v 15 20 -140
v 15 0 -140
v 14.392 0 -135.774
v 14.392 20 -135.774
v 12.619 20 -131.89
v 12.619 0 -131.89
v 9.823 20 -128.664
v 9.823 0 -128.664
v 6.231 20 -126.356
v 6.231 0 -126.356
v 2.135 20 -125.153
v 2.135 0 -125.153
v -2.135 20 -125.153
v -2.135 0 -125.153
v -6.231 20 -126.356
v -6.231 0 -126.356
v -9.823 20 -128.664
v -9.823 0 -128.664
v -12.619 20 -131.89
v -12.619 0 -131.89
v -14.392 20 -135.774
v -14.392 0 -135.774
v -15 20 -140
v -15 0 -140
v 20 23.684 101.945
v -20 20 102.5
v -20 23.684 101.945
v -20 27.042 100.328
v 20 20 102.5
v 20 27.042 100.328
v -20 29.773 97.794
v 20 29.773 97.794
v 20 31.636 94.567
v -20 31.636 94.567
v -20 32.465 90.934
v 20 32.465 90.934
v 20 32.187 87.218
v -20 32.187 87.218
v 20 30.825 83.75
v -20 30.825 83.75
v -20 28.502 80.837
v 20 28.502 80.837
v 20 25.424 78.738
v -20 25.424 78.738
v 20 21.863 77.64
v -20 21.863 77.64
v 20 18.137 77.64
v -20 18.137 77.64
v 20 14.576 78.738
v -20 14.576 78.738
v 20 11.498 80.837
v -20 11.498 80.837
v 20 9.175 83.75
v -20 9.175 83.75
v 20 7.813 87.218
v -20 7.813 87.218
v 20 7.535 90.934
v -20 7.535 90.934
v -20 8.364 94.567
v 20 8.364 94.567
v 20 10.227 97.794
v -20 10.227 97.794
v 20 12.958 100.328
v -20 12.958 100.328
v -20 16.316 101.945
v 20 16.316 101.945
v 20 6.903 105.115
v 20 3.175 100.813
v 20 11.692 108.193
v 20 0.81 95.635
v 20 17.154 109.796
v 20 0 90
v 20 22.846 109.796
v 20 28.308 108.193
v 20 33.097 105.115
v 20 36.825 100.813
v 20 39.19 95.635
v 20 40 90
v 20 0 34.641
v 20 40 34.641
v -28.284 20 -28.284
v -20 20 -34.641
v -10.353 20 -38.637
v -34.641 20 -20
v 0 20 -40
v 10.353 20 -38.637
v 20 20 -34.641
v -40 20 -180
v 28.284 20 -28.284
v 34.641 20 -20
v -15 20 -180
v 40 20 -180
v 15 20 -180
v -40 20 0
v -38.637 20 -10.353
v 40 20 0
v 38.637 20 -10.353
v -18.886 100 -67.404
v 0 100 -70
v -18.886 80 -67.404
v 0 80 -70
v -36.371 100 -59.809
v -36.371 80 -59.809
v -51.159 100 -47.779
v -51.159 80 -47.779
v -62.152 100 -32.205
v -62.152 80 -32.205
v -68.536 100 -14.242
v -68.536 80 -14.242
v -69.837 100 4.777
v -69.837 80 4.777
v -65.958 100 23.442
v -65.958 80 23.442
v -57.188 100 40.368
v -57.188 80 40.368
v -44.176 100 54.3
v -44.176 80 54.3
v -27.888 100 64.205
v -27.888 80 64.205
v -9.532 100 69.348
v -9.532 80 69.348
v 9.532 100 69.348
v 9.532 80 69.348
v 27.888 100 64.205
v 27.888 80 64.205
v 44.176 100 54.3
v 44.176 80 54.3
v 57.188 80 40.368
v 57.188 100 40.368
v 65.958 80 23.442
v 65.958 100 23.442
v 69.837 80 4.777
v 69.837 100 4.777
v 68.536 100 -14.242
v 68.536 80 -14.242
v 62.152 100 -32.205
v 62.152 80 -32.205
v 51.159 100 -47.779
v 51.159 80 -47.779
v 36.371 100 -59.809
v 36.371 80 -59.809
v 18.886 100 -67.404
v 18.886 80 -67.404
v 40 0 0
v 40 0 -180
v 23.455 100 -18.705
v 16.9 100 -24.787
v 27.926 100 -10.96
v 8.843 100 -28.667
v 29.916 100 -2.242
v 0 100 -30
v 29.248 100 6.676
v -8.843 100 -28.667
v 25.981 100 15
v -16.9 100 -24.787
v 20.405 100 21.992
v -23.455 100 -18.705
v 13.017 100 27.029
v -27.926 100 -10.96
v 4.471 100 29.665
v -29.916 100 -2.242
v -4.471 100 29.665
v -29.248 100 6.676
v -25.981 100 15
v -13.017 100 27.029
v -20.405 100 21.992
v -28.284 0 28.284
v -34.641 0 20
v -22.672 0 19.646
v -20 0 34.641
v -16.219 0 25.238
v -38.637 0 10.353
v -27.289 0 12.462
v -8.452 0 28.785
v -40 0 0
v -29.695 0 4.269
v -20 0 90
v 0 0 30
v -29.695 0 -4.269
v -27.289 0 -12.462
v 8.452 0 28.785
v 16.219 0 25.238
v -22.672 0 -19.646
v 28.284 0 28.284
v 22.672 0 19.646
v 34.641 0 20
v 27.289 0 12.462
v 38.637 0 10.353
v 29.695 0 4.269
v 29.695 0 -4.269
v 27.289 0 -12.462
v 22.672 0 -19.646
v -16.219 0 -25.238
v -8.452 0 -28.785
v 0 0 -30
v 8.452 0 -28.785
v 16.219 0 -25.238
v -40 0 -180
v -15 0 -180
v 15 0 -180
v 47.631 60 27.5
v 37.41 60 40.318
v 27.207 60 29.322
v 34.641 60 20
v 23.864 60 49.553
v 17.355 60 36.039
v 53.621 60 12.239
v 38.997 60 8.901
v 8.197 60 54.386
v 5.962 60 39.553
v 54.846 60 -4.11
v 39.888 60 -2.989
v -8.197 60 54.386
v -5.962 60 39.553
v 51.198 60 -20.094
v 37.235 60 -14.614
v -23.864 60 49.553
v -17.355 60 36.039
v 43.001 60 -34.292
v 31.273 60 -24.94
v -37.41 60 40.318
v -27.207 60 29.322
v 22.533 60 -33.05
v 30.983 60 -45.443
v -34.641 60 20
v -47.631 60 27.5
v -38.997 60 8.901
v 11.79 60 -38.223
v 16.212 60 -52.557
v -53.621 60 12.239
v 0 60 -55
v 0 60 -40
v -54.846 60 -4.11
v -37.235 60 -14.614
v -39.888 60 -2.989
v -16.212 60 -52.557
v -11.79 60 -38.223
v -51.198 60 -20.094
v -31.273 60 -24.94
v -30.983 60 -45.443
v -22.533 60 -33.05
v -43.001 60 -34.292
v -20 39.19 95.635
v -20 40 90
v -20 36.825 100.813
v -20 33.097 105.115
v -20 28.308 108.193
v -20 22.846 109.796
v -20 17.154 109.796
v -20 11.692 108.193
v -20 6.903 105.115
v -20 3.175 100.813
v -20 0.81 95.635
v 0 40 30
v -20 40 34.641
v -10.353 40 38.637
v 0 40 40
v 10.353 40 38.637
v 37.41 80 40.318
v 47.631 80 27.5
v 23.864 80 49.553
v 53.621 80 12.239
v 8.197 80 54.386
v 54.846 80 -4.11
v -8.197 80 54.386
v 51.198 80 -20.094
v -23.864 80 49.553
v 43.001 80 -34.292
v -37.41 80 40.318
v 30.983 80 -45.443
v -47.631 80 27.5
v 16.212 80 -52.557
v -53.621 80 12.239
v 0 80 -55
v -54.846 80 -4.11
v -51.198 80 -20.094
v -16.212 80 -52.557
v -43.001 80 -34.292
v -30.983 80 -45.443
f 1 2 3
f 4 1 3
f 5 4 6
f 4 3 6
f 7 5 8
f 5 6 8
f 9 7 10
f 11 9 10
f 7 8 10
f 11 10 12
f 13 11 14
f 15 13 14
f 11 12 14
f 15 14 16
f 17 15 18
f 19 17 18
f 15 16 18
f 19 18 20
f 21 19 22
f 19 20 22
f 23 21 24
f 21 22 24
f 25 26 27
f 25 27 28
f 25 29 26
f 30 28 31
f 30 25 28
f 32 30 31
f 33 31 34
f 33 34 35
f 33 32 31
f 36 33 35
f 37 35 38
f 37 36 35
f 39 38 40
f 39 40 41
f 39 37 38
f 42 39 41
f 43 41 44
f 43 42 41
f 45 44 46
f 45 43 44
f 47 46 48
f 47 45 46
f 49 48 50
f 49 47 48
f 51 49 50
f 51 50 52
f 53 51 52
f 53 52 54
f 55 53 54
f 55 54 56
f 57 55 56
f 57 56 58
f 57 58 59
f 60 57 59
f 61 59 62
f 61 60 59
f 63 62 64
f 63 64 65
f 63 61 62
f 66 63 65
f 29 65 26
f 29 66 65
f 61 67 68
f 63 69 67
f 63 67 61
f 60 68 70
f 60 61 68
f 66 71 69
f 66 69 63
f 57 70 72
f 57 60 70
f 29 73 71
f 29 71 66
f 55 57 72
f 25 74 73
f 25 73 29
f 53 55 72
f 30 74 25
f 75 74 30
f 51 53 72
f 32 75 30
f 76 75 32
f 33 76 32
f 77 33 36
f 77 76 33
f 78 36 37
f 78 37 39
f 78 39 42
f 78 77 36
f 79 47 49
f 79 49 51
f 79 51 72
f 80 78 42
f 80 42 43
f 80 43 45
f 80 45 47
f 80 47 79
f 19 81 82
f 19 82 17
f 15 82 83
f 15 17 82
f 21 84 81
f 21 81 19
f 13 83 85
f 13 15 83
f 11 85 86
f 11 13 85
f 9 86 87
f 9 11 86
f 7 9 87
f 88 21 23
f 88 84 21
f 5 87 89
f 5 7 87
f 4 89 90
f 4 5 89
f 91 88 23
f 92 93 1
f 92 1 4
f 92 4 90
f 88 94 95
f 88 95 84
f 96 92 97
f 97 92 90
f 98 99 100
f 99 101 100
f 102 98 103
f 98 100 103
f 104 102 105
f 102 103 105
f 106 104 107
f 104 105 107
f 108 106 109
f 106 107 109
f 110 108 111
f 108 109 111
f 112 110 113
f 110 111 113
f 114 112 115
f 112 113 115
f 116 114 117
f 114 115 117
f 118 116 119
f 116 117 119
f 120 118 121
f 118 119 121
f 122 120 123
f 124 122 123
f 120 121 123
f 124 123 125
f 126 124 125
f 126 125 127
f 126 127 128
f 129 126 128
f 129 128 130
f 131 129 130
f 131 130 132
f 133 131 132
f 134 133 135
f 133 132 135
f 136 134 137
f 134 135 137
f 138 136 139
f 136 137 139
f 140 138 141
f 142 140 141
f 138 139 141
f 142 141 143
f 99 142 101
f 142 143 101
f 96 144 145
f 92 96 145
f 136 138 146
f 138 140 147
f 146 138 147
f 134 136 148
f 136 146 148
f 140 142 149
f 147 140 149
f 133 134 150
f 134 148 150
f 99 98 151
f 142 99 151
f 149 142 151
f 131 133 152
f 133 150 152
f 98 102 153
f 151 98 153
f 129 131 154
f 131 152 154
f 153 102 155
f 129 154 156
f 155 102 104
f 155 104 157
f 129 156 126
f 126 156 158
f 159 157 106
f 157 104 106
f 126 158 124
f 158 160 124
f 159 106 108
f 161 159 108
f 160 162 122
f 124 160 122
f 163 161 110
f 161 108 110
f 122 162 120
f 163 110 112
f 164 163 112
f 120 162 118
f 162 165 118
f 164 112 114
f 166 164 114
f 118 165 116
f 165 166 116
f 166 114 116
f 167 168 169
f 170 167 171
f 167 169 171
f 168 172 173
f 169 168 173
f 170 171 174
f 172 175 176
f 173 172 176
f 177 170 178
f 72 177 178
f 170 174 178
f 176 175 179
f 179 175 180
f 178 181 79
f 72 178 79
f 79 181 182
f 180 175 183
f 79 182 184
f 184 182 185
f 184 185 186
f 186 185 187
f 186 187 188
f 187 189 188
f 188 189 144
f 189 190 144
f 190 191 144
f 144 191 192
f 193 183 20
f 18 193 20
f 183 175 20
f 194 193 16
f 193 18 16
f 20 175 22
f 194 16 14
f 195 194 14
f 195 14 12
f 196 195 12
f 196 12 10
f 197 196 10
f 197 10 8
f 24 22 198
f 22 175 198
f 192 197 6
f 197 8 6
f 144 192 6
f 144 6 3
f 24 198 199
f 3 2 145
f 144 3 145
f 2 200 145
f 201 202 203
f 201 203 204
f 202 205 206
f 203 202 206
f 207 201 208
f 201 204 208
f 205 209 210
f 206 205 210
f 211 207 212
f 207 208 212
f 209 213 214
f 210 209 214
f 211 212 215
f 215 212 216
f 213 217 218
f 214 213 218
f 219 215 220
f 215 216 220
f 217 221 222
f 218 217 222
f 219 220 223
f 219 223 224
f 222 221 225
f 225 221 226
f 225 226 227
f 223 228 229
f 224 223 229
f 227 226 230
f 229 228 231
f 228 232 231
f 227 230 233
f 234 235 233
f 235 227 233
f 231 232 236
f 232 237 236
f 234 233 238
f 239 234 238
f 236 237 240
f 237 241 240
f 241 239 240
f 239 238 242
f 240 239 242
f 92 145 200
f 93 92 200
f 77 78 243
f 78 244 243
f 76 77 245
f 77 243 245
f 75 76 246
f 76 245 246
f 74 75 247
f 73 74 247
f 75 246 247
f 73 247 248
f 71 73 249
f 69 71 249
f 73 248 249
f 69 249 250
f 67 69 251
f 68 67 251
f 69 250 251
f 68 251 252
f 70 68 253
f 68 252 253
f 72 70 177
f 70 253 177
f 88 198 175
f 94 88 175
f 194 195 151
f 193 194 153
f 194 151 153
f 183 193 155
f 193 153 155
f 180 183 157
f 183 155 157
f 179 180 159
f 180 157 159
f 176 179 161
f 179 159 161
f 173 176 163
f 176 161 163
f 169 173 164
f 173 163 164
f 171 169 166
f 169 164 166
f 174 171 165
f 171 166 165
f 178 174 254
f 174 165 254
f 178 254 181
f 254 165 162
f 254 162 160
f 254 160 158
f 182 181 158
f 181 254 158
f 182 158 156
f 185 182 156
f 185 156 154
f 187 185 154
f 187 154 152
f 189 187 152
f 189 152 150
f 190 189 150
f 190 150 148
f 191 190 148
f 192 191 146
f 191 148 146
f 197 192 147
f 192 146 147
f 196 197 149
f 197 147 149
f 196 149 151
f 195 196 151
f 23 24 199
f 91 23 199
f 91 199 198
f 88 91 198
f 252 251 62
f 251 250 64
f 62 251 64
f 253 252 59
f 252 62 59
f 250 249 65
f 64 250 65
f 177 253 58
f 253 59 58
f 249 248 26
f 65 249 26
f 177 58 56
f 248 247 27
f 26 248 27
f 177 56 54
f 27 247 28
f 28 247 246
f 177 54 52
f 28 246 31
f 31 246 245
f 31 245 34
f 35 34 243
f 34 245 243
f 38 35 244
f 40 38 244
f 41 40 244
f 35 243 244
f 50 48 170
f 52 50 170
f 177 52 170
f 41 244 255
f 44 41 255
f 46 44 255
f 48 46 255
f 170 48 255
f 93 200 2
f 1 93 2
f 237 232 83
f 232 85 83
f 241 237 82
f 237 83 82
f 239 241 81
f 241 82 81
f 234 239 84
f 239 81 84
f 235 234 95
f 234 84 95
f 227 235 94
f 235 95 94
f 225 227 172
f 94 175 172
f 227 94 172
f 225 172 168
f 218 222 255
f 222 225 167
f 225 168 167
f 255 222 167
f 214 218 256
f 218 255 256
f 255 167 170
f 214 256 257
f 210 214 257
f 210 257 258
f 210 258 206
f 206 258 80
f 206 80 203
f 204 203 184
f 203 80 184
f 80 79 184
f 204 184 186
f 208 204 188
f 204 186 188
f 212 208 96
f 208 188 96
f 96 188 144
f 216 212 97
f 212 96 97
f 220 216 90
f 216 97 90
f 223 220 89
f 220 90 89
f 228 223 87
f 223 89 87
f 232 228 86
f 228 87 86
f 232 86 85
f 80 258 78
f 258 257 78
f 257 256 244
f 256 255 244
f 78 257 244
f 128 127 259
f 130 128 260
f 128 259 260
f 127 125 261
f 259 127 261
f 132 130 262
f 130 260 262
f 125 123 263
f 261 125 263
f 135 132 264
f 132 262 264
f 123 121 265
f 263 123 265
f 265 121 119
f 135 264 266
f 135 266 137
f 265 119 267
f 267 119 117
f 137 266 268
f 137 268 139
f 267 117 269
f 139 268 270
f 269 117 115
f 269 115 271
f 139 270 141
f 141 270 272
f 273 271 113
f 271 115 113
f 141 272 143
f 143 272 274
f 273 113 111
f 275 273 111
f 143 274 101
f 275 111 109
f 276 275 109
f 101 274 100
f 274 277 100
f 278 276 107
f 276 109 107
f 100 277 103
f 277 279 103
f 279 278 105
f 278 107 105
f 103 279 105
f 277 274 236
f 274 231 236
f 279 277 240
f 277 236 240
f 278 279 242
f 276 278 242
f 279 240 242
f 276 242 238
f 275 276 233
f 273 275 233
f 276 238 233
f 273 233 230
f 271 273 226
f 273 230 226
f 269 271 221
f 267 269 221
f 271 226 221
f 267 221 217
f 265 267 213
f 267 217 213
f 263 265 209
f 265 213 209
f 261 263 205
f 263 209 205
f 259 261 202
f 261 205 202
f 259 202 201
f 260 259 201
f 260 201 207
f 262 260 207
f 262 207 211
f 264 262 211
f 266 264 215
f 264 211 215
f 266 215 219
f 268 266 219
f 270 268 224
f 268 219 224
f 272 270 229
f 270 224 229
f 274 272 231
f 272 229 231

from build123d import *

# Parameters (mm, degrees)
BOSS_EXTRUDE1_DEPTH = 20
SKETCH3_R           = 12.5
BOSS_EXTRUDE2_DEPTH = 20


with BuildPart() as part:
    # Sketch2 → Revolve1 (revolve)
    with BuildSketch(Plane.XY, mode=Mode.PRIVATE) as revolve1_sk:
        Polygon((-30, 0), (-30, 100), (-70, 100), (-70, 80), (-55, 80), (-55, 60), (-40, 60), (-40, 0), align=None)
    revolve(revolve1_sk.sketch.rotate(Axis((0, 0, 0), (0, 1, 0)), 270), axis=Axis((0, 0, 0), (0, 1, 0)))

    # Sketch4 → Boss-Extrude1 (add)
    with BuildSketch(Plane(origin=(0, 0, 0), x_dir=(1, 0, 0), z_dir=(0, 1, 0))):
        with BuildLine():
            Line((-15, 140), (-15, 180))
            Line((-15, 180), (-40, 180))
            Line((-40, 180), (-40, 0))
            ThreePointArc((-40, 0), (0, 40), (40, 0))
            Line((40, 0), (40, 180))
            Line((40, 180), (15, 180))
            Line((15, 180), (15, 140))
            ThreePointArc((15, 140), (0, 125), (-15, 140))
        make_face()
    extrude(amount=BOSS_EXTRUDE1_DEPTH)

    # Sketch3 → Boss-Extrude2 (add, symmetric)
    with BuildSketch(Plane.ZY):
        with BuildLine():
            Line((30, 0), (30, 40))
            Line((30, 40), (90, 40))
            ThreePointArc((90, 40), (110, 20), (90, 0))
            Line((90, 0), (30, 0))
        make_face()
        with Locations((90, 20)):
            Circle(SKETCH3_R, mode=Mode.SUBTRACT)
    extrude(amount=BOSS_EXTRUDE2_DEPTH, both=True)


solid = part.part
